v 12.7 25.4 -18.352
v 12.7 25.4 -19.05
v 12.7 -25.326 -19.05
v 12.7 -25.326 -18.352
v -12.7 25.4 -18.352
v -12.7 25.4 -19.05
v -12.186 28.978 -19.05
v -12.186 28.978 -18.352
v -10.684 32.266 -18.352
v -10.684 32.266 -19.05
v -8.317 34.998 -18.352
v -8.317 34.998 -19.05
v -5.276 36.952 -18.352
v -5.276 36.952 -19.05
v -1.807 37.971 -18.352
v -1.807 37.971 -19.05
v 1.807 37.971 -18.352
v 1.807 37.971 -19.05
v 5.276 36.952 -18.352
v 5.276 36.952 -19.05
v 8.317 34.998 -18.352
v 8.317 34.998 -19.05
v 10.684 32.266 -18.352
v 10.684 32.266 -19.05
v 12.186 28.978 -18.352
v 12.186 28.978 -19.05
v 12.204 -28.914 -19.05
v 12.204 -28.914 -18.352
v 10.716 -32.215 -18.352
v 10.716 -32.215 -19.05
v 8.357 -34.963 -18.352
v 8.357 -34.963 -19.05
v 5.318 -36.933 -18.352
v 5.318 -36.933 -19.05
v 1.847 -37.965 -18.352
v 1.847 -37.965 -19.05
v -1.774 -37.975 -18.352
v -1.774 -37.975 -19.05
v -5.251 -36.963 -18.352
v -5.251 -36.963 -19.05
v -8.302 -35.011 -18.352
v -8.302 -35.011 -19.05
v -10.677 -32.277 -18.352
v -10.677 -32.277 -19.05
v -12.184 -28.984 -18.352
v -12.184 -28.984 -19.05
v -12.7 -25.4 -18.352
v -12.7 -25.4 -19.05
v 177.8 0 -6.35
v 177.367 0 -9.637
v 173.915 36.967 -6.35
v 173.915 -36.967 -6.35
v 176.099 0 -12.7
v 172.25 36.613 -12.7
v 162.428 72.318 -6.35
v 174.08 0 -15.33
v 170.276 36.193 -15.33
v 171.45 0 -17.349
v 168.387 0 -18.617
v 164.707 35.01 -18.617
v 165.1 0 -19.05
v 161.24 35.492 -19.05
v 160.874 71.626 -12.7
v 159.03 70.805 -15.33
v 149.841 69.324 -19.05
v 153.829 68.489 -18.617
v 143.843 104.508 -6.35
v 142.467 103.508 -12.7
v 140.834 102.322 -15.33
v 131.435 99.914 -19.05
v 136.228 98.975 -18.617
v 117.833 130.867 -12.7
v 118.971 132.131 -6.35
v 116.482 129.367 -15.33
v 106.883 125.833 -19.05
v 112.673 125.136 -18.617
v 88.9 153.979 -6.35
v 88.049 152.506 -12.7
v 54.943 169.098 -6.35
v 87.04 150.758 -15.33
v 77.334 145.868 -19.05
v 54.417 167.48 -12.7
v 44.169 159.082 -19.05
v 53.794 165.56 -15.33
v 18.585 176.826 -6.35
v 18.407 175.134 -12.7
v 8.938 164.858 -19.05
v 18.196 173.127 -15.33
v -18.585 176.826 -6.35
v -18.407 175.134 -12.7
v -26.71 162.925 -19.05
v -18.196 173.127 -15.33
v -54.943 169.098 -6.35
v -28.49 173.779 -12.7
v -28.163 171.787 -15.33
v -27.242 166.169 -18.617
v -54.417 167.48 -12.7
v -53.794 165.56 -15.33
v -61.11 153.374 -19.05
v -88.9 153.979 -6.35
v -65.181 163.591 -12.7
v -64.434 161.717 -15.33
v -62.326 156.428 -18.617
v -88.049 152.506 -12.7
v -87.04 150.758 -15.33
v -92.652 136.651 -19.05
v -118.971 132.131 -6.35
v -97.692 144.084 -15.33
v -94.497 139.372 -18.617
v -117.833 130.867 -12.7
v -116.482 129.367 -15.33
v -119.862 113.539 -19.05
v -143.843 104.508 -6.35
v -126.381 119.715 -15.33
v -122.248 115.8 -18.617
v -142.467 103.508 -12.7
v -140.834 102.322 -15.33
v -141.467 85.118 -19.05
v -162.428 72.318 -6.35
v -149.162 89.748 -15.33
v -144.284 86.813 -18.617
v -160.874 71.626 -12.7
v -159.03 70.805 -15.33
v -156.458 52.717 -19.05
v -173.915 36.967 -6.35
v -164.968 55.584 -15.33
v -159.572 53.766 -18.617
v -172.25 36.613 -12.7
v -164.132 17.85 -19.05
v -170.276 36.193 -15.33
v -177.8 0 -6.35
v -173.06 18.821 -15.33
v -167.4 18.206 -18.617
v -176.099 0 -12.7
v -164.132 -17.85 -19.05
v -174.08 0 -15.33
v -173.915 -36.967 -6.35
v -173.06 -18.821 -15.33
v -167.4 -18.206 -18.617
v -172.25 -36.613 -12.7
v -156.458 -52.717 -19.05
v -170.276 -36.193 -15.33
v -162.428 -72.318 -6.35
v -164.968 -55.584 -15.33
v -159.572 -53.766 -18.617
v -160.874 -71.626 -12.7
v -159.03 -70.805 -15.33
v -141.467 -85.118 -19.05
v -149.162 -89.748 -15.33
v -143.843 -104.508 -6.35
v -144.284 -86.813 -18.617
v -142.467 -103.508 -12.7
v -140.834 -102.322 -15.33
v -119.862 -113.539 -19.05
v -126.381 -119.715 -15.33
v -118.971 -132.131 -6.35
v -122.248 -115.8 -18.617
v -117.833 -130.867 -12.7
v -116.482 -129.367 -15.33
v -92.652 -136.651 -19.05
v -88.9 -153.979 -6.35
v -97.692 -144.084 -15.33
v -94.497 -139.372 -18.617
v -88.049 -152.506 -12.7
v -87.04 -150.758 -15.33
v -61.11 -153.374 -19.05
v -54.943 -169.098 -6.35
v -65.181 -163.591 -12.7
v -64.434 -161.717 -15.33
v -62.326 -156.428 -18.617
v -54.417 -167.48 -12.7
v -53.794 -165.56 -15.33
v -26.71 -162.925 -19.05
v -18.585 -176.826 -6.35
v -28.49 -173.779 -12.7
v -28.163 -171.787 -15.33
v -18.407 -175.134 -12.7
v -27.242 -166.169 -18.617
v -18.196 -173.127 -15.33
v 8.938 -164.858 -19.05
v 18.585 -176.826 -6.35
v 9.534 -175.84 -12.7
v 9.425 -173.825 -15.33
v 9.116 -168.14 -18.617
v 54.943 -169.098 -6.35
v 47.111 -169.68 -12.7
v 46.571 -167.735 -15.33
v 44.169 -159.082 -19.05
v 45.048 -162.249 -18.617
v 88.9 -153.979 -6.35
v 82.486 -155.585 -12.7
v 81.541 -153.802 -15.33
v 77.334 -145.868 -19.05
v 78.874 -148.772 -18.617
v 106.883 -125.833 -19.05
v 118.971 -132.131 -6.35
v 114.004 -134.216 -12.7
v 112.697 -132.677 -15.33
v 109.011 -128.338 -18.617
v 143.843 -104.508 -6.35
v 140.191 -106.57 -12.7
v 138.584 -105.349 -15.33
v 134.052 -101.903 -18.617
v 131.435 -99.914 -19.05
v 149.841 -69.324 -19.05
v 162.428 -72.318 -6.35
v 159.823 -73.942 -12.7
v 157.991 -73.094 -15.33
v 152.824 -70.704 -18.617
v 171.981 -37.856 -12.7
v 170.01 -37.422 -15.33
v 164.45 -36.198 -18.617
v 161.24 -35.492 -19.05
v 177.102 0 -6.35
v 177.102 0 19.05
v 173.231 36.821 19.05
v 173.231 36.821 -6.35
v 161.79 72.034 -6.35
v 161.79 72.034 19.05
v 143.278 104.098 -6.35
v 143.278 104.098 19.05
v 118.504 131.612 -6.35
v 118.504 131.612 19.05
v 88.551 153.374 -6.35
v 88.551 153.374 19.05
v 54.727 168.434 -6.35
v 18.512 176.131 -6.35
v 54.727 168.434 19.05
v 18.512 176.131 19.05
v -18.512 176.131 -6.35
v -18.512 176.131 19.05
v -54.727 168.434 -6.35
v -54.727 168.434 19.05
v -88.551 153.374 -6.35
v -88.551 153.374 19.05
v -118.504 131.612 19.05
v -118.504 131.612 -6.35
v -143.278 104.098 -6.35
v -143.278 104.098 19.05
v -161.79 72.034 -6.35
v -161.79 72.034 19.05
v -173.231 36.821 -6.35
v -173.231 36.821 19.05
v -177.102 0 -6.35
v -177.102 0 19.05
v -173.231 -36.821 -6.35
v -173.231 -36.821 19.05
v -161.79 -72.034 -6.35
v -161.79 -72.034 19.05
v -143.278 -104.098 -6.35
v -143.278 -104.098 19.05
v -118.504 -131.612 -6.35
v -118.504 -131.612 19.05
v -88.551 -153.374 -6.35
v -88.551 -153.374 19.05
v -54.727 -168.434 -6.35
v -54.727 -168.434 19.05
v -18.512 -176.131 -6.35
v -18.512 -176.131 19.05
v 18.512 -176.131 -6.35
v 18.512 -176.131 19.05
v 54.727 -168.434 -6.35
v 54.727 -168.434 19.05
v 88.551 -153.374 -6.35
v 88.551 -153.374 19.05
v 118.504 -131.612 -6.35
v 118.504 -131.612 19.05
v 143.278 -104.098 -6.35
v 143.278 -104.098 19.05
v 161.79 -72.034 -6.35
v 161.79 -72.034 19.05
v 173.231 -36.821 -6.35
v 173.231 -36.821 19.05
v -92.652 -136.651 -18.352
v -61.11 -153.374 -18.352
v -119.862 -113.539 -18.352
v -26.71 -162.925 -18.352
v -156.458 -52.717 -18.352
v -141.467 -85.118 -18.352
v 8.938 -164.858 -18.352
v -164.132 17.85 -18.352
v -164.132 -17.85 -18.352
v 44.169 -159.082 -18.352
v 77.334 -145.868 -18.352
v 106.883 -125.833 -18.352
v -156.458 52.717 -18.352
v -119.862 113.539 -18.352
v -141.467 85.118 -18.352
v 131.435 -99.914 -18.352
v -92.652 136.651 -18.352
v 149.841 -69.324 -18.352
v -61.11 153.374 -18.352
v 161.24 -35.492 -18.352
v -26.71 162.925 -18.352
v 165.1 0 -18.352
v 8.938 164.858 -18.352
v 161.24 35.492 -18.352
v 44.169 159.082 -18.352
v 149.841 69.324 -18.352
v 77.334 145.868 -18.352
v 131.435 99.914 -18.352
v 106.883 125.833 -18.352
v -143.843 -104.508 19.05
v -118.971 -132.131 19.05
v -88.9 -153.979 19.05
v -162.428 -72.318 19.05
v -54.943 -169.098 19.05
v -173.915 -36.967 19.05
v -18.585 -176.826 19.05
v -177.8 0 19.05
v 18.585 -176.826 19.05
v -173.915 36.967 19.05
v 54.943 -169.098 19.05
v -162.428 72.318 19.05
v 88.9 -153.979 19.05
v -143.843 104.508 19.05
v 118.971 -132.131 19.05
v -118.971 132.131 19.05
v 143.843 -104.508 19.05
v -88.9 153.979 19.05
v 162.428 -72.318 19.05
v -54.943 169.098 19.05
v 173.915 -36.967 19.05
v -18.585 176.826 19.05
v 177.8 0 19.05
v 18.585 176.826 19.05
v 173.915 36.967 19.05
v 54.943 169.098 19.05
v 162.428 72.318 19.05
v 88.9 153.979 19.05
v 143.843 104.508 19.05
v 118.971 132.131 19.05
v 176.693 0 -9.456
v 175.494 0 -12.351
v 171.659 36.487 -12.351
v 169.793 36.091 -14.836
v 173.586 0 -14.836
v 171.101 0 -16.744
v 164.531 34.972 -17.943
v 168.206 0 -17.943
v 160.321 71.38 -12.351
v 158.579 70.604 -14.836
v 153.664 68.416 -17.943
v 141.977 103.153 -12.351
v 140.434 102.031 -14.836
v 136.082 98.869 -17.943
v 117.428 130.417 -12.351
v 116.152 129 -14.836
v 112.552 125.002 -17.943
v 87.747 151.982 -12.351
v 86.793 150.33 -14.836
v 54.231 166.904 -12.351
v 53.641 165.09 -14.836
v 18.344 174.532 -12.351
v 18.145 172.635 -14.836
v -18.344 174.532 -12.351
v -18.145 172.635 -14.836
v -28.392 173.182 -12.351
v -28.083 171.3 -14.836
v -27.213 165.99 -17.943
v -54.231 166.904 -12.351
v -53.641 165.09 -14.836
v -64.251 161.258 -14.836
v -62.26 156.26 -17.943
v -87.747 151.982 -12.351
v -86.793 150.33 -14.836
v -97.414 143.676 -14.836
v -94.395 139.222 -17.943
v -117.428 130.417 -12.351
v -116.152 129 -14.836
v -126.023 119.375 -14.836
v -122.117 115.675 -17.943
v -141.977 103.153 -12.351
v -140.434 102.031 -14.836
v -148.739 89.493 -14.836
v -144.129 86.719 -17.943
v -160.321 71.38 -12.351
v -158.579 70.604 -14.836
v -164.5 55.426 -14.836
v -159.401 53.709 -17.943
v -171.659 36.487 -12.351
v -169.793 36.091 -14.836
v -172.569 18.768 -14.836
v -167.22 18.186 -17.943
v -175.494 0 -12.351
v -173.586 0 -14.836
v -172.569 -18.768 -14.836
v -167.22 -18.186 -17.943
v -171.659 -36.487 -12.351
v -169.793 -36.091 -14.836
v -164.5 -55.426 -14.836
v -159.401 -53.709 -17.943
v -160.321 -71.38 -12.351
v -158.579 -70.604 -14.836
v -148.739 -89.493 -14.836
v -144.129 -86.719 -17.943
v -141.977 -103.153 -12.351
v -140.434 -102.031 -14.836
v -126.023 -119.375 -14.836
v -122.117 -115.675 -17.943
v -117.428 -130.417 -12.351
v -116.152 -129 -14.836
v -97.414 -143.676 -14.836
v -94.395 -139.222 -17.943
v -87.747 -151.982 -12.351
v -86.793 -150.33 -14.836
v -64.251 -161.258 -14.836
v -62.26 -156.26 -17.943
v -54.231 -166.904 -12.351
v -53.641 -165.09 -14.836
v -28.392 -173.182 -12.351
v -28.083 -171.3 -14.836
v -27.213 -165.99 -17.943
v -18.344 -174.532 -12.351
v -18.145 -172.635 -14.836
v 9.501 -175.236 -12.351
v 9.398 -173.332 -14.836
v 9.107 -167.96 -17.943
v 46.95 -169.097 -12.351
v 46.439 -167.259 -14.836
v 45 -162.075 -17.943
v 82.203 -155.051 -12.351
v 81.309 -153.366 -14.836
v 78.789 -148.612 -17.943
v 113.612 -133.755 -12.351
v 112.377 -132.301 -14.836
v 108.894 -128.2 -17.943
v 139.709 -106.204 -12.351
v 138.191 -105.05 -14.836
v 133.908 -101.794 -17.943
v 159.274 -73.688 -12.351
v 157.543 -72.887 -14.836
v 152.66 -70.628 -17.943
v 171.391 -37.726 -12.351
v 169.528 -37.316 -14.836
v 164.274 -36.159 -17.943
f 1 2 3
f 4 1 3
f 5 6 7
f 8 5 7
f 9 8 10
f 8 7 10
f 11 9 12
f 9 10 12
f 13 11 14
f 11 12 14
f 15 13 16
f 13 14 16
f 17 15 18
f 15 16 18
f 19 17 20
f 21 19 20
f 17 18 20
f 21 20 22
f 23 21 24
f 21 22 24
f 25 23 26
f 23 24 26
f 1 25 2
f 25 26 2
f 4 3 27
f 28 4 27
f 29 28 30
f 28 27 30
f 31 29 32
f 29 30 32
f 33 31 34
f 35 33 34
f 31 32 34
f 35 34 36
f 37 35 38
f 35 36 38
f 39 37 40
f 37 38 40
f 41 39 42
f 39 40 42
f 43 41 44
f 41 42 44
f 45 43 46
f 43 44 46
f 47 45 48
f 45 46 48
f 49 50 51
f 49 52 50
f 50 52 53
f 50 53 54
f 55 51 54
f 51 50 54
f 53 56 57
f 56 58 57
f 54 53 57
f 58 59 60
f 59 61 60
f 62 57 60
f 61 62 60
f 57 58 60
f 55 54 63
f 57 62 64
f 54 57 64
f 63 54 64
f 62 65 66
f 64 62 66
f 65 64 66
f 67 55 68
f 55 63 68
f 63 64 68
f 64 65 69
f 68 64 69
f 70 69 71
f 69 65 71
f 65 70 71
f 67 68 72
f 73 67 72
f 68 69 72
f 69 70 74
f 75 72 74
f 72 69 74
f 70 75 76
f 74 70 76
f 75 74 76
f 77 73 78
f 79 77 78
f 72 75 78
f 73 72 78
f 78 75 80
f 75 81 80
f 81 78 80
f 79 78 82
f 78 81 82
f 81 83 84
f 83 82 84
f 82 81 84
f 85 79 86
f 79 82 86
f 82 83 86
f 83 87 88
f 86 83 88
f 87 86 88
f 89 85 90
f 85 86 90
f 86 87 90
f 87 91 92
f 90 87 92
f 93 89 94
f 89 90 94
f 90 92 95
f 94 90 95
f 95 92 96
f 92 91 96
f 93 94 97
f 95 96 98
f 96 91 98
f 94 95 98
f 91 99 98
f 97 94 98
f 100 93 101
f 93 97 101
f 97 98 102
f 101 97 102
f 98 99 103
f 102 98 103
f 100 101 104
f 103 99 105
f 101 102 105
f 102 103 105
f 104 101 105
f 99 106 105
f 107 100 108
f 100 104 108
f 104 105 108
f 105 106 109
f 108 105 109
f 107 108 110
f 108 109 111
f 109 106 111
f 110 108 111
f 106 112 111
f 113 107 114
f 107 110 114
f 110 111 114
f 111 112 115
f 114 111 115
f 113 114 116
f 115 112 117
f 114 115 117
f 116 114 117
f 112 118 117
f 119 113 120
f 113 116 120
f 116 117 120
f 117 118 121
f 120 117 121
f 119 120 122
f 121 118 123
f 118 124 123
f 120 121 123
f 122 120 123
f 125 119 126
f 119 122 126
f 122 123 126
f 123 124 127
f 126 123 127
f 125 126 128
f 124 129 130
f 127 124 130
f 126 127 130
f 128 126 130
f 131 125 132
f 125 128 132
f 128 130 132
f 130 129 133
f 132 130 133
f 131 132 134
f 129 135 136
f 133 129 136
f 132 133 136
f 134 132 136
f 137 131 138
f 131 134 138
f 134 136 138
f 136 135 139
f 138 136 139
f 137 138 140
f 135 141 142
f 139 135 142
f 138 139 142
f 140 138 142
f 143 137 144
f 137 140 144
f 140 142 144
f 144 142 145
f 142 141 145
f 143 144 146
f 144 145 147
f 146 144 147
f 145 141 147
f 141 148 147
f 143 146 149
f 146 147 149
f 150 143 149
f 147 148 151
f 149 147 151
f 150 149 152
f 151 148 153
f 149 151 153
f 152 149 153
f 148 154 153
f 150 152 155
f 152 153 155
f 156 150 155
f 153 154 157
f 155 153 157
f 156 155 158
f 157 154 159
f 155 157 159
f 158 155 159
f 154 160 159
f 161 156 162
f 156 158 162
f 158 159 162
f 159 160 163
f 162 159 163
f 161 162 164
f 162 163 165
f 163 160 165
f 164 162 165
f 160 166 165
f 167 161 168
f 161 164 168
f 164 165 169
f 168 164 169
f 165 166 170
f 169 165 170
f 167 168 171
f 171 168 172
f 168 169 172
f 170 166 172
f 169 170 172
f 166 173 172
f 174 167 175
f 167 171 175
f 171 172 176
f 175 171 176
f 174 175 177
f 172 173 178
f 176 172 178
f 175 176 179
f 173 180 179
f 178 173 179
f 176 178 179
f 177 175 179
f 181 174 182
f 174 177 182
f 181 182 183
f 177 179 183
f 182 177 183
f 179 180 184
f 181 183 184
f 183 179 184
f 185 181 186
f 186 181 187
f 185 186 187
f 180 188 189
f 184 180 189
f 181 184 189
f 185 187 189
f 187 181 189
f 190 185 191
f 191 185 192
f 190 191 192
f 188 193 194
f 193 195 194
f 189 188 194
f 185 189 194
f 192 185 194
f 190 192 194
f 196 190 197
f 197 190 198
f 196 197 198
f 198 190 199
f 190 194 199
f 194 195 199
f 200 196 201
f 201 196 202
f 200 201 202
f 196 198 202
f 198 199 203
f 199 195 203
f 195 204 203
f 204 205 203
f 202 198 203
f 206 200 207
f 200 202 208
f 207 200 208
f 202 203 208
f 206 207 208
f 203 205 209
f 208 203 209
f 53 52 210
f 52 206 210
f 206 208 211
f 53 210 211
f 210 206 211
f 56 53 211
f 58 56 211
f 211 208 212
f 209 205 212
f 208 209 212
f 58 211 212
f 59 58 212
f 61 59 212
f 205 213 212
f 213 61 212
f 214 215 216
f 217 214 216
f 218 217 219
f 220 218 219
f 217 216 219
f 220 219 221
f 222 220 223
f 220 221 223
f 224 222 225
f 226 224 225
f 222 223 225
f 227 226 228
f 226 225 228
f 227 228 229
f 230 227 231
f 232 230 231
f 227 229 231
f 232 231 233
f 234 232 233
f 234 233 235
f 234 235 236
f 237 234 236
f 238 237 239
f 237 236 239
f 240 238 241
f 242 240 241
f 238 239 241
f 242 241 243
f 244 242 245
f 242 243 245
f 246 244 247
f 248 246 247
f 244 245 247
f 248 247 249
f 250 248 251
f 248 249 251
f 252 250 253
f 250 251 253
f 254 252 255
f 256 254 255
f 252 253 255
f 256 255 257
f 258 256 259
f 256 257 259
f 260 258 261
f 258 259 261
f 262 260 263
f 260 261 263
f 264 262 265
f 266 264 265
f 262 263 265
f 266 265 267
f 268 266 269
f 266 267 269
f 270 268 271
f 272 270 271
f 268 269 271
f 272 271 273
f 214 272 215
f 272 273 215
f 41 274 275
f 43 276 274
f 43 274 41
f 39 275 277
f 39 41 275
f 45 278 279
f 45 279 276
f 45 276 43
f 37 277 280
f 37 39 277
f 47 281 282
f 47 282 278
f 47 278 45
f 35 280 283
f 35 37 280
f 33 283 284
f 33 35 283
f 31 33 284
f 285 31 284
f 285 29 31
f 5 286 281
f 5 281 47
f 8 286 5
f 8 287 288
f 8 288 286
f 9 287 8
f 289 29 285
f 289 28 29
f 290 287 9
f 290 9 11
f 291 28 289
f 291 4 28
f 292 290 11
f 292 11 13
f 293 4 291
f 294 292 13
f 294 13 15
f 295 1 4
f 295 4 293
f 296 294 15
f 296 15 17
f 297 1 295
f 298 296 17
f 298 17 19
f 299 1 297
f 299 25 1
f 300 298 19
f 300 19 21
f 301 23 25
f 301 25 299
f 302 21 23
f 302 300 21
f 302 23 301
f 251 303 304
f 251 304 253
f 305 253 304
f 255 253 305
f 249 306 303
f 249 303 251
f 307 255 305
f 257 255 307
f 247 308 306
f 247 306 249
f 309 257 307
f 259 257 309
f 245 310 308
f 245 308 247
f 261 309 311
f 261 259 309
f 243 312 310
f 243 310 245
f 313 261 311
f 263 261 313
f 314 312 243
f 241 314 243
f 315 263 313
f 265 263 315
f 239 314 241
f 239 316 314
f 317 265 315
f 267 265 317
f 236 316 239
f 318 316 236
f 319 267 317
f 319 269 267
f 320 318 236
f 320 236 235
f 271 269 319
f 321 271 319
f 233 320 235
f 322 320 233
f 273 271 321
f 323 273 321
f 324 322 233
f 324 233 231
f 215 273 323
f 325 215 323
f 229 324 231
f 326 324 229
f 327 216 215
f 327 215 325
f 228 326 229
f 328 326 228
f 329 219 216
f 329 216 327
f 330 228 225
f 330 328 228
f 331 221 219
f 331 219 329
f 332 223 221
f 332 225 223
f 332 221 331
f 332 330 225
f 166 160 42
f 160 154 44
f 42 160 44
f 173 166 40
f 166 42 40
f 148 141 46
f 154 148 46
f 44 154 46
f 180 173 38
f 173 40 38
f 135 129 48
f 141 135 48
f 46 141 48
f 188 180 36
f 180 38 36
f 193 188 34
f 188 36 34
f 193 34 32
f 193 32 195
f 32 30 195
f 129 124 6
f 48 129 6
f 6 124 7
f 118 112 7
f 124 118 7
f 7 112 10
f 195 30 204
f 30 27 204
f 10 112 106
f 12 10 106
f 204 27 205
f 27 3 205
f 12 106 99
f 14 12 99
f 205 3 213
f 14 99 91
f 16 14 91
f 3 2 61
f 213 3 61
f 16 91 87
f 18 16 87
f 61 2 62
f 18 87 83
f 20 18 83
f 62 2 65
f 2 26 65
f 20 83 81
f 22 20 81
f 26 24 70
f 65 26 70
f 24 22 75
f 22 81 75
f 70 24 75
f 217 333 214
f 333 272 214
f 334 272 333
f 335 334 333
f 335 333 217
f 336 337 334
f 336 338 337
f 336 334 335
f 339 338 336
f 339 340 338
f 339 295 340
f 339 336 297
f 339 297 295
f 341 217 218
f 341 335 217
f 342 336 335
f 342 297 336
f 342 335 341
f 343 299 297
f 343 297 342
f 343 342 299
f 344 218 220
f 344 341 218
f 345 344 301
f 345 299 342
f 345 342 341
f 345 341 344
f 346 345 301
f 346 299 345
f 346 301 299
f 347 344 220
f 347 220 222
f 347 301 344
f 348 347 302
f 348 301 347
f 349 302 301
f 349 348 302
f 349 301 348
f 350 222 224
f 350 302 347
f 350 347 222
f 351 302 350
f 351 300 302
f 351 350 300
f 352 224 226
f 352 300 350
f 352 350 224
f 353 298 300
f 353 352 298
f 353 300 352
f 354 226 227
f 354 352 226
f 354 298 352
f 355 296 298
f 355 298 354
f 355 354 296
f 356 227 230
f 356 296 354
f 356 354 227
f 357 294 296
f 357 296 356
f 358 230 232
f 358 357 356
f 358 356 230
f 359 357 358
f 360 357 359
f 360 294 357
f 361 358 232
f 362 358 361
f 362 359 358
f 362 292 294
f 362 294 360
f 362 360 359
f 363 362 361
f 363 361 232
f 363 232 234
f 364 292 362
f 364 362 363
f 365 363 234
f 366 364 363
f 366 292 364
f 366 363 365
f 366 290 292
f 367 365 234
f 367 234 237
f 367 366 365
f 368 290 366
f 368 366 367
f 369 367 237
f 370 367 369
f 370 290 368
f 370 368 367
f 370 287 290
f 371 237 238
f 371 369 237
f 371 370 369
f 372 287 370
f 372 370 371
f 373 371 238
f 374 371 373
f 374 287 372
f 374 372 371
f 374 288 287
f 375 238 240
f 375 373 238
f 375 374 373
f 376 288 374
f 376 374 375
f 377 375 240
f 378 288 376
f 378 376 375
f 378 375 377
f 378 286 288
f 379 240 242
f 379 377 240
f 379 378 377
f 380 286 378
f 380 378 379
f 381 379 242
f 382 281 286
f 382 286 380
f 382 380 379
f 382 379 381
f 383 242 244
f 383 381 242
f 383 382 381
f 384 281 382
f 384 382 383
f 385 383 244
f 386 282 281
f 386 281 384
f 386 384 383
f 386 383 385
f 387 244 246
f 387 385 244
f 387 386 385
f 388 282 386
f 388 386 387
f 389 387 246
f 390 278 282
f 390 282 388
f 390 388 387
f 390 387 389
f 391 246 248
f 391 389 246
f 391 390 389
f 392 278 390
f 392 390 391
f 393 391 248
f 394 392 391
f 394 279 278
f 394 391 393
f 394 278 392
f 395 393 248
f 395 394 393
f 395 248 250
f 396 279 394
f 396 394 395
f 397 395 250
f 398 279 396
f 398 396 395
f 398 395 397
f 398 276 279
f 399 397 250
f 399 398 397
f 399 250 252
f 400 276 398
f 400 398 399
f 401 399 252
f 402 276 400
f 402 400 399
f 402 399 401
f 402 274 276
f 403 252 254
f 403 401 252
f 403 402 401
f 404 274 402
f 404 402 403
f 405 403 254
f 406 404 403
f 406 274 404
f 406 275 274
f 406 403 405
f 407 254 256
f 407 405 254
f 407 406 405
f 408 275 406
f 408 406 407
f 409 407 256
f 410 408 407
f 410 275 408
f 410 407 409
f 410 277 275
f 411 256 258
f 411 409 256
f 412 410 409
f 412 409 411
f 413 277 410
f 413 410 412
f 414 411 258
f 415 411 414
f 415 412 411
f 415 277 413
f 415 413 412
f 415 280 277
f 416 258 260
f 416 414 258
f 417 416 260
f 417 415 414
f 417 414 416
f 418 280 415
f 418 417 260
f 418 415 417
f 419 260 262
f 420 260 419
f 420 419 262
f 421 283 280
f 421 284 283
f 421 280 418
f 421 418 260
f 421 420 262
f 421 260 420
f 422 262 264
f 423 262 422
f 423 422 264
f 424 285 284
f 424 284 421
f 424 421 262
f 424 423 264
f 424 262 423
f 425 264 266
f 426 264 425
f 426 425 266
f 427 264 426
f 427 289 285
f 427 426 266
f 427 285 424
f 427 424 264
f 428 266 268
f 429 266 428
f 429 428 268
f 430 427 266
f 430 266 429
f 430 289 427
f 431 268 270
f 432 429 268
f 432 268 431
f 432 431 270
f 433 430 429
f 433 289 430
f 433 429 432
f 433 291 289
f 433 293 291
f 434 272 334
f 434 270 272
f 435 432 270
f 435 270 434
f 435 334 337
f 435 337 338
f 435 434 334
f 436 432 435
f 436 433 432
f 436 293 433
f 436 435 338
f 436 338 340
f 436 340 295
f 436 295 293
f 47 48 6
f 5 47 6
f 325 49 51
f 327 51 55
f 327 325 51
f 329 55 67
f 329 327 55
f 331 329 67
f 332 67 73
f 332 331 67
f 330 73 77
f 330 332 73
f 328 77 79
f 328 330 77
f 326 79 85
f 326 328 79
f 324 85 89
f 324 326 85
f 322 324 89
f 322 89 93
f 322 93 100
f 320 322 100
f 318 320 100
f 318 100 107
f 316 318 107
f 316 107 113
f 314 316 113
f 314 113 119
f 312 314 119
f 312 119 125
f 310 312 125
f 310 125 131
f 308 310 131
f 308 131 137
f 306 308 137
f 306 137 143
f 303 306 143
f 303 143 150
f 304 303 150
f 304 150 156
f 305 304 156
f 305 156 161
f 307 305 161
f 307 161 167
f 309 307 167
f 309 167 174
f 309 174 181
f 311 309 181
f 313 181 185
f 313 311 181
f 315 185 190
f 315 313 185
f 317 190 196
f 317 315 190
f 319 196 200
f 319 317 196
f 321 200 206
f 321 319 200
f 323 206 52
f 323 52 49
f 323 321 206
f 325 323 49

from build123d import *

# Parameters (mm, degrees)
F0_R     = 177.8
F1_DEPTH = 19.05
F2_R     = 12.7
F3_T     = -0.6985
F5_DEPTH = 12.7


with BuildPart() as f1:
    # F0 (on Top) → F1 (new body, symmetric)
    with BuildSketch(Plane.XY):
        Circle(F0_R)
    extrude(amount=F1_DEPTH, both=True)

    # F2
    f2_edges = [f1.edges().sort_by_distance(p)[0] for p in [
        (-177.8, 0, -19.05),
    ]]
    fillet(f2_edges, radius=F2_R)

    # F3
    f3_openings = [f1.faces().sort_by_distance(p)[0] for p in [
        (0, 0, 19.05),
    ]]
    offset(amount=F3_T, openings=f3_openings)

    # F4 (on face) → F5 (cut, symmetric)
    with BuildSketch(Plane(origin=(0, 0, -19.05), x_dir=(1, 0, 0), z_dir=(0, 0, -1))):
        with BuildLine():
            Line((12.7, -25.399946), (12.699786, 25.326312))
            ThreePointArc((12.699786, 25.326312), (0.036844, 38.099947), (-12.7, 25.4))
            Line((-12.7, 25.4), (-12.7, -25.4))
            ThreePointArc((-12.7, -25.4), (2.7e-05, -38.1), (12.7, -25.399946))
        make_face()
    extrude(amount=F5_DEPTH, both=True, mode=Mode.SUBTRACT)


solid = f1.part
